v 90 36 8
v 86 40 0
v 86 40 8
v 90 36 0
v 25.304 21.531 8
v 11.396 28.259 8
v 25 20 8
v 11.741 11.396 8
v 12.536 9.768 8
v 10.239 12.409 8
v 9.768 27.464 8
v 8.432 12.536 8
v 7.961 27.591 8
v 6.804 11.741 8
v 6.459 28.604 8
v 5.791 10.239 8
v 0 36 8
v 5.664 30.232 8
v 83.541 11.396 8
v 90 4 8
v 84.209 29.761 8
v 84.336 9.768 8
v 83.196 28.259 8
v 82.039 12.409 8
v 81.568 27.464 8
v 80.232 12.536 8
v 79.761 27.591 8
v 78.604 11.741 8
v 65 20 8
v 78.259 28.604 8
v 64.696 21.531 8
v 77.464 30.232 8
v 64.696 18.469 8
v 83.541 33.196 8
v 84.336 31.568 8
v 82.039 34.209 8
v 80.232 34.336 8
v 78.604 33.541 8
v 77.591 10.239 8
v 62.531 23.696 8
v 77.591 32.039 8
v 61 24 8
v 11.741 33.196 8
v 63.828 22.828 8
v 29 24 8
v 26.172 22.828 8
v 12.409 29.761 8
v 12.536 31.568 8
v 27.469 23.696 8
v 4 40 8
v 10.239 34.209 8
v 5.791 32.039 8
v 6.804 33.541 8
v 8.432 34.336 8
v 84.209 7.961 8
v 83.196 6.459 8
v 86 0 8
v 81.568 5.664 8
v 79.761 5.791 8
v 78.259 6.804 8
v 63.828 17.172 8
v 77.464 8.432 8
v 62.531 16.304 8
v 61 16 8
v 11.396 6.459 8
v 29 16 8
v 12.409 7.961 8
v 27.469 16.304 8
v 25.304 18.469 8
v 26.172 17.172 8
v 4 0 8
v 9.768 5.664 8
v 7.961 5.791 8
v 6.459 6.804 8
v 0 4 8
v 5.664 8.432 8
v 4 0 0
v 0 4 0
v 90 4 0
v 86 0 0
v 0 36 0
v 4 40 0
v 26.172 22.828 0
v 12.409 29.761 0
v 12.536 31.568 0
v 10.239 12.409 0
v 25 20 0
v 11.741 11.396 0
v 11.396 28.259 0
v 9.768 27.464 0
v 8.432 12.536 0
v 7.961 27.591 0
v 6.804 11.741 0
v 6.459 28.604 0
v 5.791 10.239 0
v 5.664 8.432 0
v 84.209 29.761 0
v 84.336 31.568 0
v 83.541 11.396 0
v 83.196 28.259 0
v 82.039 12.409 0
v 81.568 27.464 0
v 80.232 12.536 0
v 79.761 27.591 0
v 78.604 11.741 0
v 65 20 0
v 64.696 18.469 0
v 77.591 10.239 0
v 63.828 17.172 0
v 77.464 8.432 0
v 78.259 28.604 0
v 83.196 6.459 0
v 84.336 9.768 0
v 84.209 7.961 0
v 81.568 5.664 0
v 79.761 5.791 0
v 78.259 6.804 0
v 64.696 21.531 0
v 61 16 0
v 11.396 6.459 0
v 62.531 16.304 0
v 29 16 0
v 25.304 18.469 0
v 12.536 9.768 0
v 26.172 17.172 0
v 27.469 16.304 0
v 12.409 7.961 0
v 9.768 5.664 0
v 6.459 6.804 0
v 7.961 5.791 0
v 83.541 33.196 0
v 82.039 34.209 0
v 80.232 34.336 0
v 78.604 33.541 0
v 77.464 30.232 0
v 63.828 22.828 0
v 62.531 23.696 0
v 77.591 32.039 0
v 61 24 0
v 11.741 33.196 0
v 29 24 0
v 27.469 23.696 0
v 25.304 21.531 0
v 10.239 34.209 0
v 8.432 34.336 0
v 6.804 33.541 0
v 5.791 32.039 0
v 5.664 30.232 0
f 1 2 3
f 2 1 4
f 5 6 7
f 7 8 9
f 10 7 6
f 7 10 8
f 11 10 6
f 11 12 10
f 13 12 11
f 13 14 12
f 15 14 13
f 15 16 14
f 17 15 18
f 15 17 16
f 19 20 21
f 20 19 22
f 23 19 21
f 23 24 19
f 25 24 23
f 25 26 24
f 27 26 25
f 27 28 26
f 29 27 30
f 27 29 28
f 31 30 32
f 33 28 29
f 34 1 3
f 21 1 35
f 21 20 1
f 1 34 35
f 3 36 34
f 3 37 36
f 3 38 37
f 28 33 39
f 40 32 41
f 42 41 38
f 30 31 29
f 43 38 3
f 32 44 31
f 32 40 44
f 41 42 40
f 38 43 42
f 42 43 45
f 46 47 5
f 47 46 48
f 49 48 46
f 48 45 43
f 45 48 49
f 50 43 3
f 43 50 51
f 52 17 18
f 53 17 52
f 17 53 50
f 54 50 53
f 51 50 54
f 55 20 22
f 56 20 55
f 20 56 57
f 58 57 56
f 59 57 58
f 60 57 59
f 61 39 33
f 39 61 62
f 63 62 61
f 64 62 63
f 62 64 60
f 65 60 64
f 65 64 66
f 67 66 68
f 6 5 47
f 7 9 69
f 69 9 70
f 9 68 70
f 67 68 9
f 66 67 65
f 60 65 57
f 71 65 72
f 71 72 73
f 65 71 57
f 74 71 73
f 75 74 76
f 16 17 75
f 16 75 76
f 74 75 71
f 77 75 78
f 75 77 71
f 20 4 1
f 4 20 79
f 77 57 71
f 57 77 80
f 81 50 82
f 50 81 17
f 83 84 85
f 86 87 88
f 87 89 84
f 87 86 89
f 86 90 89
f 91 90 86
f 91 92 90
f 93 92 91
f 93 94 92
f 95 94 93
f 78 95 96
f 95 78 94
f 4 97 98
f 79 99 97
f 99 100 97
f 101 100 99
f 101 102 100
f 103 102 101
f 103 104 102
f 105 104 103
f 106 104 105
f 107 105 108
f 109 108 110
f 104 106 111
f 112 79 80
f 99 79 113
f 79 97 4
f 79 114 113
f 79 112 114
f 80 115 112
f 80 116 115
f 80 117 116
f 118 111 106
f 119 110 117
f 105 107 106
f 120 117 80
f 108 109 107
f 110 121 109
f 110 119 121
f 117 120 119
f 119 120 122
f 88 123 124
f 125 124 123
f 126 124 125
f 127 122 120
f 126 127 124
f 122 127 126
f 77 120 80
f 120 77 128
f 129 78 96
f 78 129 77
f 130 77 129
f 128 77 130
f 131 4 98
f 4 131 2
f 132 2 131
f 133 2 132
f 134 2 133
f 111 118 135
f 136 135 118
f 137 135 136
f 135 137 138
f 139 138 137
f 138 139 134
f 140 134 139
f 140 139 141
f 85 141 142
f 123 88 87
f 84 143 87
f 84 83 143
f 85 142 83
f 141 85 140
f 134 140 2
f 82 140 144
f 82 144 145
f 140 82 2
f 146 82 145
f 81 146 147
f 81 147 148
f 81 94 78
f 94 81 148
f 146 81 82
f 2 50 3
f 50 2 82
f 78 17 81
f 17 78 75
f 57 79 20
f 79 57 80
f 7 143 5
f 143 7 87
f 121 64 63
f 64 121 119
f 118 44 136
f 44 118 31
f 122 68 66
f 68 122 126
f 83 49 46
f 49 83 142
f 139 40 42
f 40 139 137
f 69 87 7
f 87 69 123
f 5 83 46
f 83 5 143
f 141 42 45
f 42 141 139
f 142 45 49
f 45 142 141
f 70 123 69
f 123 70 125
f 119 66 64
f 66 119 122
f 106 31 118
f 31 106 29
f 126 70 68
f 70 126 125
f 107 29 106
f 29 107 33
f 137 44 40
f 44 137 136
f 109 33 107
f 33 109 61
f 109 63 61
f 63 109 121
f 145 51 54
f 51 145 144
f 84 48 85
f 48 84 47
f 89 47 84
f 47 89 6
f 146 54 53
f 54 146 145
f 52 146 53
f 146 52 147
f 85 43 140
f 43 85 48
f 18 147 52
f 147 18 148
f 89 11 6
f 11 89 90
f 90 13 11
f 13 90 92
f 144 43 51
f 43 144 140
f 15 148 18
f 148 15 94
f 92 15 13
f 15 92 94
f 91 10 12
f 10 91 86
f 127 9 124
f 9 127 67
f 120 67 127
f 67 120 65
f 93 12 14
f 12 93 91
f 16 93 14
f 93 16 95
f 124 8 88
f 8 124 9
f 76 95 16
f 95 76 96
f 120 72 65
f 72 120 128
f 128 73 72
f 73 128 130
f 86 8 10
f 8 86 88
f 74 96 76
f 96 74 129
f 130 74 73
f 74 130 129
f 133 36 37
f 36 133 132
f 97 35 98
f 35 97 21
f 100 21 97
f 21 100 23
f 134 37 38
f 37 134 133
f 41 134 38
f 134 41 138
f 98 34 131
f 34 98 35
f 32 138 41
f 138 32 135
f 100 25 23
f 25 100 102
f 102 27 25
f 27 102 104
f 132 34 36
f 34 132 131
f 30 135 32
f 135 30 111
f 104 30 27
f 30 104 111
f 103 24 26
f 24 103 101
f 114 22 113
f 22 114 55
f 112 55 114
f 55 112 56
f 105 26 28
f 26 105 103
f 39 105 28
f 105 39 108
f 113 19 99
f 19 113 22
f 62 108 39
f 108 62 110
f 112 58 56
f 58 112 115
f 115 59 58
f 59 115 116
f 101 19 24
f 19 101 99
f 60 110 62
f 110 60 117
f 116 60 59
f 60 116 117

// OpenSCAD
$fn = 32;

// ----------------------------------------------------------------------
// Bracket plate: slot plate 90 x 40
// ----------------------------------------------------------------------

// --- parameters (mm) ---
hole_r = 3.5;             // bolt hole radius
plate_t = 8;              // plate thickness, Z (extrusion height)
plate_l = 90;             // plate length
plate_w = 40;             // plate width
slot_l = 32;              // slot straight length
slot_r = 4;               // slot end radius

slot_len = slot_l + 2 * slot_r;
slot_w = 2 * slot_r;
hole_d2 = 2 * hole_r;

profile = [[4, 0], [86, 0], [90, 4], [90, 36], [86, 40], [4, 40], [0, 36], [0, 4]];  // primary outline, 8 points, counter clockwise
void_1 = [[61, 16], [62.531, 16.304], [63.828, 17.172], [64.696, 18.469], [65, 20], [64.696, 21.531], [63.828, 22.828], [62.531, 23.696], [61, 24], [29, 24], [27.469, 23.696], [26.172, 22.828], [25.304, 21.531], [25, 20], [25.304, 18.469], [26.172, 17.172], [27.469, 16.304], [29, 16]];  // grip slot, 18 points
void_2 = [[12.536, 31.568], [11.741, 33.196], [10.239, 34.209], [8.432, 34.336], [6.804, 33.541], [5.791, 32.039], [5.664, 30.232], [6.459, 28.604], [7.961, 27.591], [9.768, 27.464], [11.396, 28.259], [12.409, 29.761]];  // corner hole, 12 points
void_3 = [[12.536, 9.768], [11.741, 11.396], [10.239, 12.409], [8.432, 12.536], [6.804, 11.741], [5.791, 10.239], [5.664, 8.432], [6.459, 6.804], [7.961, 5.791], [9.768, 5.664], [11.396, 6.459], [12.409, 7.961]];  // corner hole, 12 points
void_4 = [[84.336, 31.568], [83.541, 33.196], [82.039, 34.209], [80.232, 34.336], [78.604, 33.541], [77.591, 32.039], [77.464, 30.232], [78.259, 28.604], [79.761, 27.591], [81.568, 27.464], [83.196, 28.259], [84.209, 29.761]];  // corner hole, 12 points
void_5 = [[84.336, 9.768], [83.541, 11.396], [82.039, 12.409], [80.232, 12.536], [78.604, 11.741], [77.591, 10.239], [77.464, 8.432], [78.259, 6.804], [79.761, 5.791], [81.568, 5.664], [83.196, 6.459], [84.209, 7.961]];  // corner hole, 12 points

// --- the one profile operation ---
difference() {
  linear_extrude(height = plate_t) polygon(points = profile);
  translate([0, 0, -1])
    linear_extrude(height = plate_t + 2) polygon(points = void_1);
  translate([0, 0, -1])
    linear_extrude(height = plate_t + 2) polygon(points = void_2);
  translate([0, 0, -1])
    linear_extrude(height = plate_t + 2) polygon(points = void_3);
  translate([0, 0, -1])
    linear_extrude(height = plate_t + 2) polygon(points = void_4);
  translate([0, 0, -1])
    linear_extrude(height = plate_t + 2) polygon(points = void_5);
}
